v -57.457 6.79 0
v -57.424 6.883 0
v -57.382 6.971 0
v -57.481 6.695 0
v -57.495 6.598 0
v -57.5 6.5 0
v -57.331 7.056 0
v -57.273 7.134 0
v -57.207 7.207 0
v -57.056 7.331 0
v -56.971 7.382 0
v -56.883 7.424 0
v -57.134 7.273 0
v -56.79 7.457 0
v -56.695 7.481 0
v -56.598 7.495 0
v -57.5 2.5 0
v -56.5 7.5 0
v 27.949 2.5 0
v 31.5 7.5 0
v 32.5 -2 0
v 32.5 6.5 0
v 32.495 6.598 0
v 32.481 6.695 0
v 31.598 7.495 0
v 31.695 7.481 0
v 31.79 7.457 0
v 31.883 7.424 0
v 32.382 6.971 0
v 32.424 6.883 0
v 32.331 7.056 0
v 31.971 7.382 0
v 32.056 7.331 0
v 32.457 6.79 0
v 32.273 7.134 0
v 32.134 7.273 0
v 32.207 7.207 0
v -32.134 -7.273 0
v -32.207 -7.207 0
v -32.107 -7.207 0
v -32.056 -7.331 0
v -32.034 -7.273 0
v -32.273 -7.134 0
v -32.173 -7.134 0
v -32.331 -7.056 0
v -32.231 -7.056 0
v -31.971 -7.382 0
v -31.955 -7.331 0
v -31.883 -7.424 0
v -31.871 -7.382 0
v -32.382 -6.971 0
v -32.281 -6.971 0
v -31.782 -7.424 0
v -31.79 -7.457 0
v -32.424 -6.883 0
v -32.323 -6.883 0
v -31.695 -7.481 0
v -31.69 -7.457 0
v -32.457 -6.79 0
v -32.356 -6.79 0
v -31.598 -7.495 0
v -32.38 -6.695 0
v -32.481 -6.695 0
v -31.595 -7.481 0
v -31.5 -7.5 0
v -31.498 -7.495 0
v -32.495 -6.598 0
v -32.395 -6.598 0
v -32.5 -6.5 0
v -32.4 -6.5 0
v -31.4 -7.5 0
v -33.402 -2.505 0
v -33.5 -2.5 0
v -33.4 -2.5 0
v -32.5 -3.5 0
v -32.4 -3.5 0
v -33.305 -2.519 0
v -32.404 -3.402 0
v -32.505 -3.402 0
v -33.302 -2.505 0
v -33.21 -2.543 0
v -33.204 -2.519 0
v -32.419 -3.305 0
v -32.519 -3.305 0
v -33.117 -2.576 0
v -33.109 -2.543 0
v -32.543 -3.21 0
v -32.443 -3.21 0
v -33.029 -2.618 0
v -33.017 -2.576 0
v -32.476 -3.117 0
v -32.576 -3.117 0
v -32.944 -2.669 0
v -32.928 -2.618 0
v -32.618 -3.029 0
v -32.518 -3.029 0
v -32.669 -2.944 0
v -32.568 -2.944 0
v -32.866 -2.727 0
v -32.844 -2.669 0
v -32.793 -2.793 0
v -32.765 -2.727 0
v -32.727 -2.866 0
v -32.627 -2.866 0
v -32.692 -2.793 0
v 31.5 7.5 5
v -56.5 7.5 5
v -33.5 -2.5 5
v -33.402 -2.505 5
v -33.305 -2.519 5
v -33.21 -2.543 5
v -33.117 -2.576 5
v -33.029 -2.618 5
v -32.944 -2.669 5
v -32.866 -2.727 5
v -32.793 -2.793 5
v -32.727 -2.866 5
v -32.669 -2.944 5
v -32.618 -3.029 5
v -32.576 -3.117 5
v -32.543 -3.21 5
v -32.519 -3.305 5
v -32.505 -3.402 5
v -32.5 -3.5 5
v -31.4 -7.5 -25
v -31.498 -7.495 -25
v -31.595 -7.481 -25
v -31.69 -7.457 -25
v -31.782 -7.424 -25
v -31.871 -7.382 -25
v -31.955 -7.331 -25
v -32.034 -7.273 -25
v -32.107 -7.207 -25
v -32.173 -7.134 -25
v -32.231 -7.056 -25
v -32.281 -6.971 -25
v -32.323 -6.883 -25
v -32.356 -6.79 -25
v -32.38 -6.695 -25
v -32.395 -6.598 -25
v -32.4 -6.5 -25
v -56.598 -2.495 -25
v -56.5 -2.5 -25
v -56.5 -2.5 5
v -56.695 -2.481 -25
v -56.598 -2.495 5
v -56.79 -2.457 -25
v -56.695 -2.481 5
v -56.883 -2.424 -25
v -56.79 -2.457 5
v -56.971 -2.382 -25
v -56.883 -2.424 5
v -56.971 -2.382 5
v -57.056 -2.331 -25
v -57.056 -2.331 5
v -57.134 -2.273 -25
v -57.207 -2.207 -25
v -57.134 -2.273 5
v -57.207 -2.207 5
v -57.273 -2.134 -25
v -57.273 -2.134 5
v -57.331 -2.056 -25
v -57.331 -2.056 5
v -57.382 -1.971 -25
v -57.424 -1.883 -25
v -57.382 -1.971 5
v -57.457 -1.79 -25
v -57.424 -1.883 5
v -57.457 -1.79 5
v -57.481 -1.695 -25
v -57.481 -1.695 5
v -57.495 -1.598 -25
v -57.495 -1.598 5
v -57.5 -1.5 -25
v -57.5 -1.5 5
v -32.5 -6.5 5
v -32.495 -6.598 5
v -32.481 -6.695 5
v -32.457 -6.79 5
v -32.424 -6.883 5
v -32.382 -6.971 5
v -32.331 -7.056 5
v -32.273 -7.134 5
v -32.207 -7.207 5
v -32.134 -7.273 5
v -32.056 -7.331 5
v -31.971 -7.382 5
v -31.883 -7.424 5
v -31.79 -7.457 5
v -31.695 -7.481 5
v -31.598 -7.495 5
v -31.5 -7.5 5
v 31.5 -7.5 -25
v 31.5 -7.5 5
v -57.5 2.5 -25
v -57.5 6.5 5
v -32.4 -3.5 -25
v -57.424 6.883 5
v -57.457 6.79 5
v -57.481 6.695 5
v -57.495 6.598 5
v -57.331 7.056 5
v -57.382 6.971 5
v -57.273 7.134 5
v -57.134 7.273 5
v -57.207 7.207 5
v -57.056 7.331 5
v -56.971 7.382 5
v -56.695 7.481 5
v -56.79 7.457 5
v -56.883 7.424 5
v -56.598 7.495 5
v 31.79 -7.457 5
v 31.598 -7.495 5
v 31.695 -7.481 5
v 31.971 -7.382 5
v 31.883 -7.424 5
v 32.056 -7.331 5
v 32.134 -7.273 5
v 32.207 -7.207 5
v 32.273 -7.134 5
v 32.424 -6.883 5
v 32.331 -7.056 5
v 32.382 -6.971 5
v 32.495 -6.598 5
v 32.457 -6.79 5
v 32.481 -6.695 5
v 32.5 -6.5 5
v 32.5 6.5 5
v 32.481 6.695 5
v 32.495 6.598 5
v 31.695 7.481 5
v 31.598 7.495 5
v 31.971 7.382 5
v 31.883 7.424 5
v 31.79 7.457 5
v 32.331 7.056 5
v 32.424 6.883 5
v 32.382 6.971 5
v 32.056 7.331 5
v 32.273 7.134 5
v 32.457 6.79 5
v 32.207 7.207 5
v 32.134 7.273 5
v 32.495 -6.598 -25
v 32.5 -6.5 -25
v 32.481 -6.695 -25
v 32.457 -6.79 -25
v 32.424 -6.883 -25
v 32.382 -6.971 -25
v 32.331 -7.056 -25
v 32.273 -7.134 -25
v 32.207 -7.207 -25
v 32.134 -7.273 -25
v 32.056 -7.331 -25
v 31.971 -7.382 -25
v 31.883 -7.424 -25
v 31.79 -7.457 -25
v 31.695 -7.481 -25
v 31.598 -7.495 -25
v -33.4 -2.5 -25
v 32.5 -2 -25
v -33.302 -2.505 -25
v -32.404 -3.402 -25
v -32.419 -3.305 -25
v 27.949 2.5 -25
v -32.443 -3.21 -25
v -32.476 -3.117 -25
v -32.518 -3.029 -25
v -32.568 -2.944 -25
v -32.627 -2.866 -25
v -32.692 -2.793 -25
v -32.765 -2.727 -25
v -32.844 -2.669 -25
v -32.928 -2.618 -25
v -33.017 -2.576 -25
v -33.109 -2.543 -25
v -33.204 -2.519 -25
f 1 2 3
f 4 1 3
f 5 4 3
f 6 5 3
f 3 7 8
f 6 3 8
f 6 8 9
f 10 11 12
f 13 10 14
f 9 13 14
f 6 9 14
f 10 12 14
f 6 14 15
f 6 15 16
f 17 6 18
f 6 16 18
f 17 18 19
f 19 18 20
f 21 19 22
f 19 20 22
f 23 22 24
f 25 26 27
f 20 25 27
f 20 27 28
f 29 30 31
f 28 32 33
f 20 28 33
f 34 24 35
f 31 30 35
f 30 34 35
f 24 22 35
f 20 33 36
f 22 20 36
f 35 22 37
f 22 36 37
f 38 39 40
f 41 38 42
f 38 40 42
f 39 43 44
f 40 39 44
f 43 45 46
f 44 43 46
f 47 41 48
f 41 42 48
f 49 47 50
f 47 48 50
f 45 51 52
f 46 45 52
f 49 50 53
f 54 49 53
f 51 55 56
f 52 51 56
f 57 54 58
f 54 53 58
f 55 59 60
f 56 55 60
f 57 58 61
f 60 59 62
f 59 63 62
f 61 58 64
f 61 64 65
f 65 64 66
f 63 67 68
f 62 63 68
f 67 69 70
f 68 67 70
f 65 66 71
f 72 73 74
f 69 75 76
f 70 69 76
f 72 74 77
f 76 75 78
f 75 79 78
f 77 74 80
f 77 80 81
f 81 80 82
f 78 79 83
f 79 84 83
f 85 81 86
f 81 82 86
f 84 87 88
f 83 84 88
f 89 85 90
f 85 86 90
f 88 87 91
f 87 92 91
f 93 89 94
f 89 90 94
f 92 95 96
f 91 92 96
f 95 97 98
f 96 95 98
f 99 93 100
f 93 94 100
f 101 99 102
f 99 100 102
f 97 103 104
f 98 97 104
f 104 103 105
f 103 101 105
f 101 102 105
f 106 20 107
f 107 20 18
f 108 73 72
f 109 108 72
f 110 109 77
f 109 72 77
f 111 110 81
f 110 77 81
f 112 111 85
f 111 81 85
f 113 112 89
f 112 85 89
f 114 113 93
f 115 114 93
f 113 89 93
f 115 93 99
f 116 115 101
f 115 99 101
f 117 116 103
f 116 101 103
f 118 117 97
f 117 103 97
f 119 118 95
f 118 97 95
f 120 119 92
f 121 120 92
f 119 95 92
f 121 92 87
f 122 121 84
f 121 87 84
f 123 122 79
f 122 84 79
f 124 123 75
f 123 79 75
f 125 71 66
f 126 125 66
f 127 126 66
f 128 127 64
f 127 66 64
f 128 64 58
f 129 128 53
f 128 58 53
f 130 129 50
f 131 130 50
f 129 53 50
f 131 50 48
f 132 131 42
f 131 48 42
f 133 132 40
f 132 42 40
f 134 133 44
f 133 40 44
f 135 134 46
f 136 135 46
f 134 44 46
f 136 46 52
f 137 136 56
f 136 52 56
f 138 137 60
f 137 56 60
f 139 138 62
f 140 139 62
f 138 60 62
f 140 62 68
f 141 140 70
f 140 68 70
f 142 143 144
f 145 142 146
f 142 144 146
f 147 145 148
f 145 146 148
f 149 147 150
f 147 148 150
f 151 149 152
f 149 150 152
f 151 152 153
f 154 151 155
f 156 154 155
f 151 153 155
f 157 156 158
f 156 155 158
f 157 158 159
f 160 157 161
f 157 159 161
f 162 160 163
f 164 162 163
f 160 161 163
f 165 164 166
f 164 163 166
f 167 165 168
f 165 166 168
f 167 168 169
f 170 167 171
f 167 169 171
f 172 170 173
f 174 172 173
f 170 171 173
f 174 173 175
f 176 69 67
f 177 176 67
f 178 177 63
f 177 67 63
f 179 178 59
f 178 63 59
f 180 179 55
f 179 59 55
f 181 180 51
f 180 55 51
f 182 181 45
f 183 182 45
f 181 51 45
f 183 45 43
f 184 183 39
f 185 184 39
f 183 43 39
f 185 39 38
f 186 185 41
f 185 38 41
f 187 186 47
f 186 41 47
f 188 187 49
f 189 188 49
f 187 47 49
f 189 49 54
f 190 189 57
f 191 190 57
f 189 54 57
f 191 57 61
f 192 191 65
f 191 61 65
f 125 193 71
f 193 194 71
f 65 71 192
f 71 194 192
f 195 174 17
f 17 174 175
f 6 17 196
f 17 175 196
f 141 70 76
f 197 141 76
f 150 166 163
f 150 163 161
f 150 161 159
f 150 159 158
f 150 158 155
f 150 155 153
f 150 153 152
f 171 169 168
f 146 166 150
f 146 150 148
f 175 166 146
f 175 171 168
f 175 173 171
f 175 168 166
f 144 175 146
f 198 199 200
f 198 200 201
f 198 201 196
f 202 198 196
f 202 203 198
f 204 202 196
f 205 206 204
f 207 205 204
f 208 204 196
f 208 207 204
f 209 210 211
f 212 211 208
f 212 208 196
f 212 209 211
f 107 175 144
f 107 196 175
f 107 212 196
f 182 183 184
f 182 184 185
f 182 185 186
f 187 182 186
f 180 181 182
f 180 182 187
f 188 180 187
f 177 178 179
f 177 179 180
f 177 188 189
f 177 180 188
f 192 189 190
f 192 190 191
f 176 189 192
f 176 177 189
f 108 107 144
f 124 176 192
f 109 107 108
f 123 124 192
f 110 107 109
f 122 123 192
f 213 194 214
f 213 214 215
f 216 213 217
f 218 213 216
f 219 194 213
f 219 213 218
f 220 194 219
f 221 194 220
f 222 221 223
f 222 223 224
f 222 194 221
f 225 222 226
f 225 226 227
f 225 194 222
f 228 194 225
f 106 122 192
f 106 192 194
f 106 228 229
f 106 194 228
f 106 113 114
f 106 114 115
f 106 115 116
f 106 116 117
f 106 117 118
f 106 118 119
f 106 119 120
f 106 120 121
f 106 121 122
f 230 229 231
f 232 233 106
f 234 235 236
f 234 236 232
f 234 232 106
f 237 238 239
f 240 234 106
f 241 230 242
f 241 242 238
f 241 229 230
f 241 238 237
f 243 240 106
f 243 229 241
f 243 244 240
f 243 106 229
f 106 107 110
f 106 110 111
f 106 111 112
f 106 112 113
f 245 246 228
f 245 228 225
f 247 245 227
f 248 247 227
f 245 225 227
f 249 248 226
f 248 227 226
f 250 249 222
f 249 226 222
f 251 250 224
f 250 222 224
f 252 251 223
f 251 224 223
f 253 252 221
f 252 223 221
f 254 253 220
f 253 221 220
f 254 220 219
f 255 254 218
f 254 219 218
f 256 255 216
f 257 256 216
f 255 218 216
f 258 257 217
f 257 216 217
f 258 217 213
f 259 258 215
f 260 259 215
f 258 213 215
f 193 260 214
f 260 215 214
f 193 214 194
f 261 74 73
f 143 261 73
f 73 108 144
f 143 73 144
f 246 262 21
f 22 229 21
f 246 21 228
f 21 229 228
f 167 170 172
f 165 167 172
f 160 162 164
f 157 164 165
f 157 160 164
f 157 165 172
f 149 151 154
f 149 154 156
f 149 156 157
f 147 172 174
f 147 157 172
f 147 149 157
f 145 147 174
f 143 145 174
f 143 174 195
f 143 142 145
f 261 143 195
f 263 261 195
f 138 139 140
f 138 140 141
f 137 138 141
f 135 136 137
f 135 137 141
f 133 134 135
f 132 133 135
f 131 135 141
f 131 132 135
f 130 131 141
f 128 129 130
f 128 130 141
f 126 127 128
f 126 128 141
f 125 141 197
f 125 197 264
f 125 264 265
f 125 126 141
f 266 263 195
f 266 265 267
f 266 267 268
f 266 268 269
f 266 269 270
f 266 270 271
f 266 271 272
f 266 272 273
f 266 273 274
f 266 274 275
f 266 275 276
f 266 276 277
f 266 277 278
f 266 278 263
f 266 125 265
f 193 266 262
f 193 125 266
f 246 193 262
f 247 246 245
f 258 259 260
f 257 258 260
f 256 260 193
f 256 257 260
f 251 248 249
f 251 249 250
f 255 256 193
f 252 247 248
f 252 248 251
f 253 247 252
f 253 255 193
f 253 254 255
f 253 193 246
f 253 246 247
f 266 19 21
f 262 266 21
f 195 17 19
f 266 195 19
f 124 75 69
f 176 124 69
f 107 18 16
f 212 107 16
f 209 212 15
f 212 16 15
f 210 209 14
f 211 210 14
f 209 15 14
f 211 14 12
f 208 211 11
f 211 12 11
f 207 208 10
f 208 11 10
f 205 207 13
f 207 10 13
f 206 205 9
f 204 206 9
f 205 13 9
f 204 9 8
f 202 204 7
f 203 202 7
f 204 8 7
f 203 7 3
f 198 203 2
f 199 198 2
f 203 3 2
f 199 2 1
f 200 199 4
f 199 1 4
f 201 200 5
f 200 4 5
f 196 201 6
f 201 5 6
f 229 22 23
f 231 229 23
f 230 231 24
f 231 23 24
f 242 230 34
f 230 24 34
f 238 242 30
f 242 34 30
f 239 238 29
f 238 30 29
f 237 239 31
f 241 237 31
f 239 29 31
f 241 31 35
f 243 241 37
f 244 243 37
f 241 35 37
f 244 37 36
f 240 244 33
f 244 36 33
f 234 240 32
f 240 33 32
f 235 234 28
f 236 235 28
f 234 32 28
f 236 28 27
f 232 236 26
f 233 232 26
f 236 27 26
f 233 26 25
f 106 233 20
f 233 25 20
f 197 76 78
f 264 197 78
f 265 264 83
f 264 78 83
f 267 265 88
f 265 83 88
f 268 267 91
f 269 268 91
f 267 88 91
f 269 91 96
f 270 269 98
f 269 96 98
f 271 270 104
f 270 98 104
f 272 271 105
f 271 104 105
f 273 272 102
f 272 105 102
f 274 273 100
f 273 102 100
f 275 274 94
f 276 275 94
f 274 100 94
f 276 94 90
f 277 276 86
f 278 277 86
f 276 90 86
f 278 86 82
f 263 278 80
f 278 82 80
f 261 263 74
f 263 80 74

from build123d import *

# Parameters (mm, degrees)
F1_DEPTH = 5
F3_DEPTH = 25


with BuildPart() as f1:
    # F0 (on Top) → F1 (new body)
    with BuildSketch(Plane.XY):
        with BuildLine():
            ThreePointArc((-32.5, -6.5), (-32.207107, -7.207107), (-31.5, -7.5))
            Line((-31.5, -7.5), (31.5, -7.5))
            ThreePointArc((31.5, -7.5), (32.207107, -7.207107), (32.5, -6.5))
            Line((32.5, -6.5), (32.5, 6.5))
            ThreePointArc((32.5, 6.5), (32.207107, 7.207107), (31.5, 7.5))
            Line((31.5, 7.5), (-32.5, 7.5))
            Line((-32.5, 7.5), (-56.5, 7.5))
            ThreePointArc((-56.5, 7.5), (-57.207107, 7.207107), (-57.5, 6.5))
            Line((-57.5, 6.5), (-57.5, -1.5))
            ThreePointArc((-57.5, -1.5), (-57.207107, -2.207107), (-56.5, -2.5))
            Line((-56.5, -2.5), (-33.5, -2.5))
            ThreePointArc((-33.5, -2.5), (-32.792893, -2.792893), (-32.5, -3.5))
            Line((-32.5, -3.5), (-32.5, -6.5))
        make_face()
    extrude(amount=F1_DEPTH)

    # F2 (on face) → F3 (join)
    with BuildSketch(Plane(origin=(0, 0, 0), x_dir=(1, 0, 0), z_dir=(0, 0, -1))):
        with BuildLine():
            Line((-57.5, 1.5), (-57.5, -2.5))
            Line((-57.5, -2.5), (27.949167, -2.5))
            Line((27.949167, -2.5), (32.5, 2))
            Line((32.5, 2), (32.5, 6.5))
            ThreePointArc((32.5, 6.5), (32.207107, 7.207107), (31.5, 7.5))
            Line((31.5, 7.5), (-31.39955, 7.5))
            ThreePointArc((-31.39955, 7.5), (-32.106657, 7.207107), (-32.39955, 6.5))
            Line((-32.39955, 6.5), (-32.39955, 3.5))
            ThreePointArc((-32.39955, 3.5), (-32.692443, 2.792893), (-33.39955, 2.5))
            Line((-33.39955, 2.5), (-33.5, 2.5))
            Line((-33.5, 2.5), (-56.5, 2.5))
            ThreePointArc((-56.5, 2.5), (-57.207107, 2.207107), (-57.5, 1.5))
        make_face()
    extrude(amount=F3_DEPTH)


solid = f1.part
